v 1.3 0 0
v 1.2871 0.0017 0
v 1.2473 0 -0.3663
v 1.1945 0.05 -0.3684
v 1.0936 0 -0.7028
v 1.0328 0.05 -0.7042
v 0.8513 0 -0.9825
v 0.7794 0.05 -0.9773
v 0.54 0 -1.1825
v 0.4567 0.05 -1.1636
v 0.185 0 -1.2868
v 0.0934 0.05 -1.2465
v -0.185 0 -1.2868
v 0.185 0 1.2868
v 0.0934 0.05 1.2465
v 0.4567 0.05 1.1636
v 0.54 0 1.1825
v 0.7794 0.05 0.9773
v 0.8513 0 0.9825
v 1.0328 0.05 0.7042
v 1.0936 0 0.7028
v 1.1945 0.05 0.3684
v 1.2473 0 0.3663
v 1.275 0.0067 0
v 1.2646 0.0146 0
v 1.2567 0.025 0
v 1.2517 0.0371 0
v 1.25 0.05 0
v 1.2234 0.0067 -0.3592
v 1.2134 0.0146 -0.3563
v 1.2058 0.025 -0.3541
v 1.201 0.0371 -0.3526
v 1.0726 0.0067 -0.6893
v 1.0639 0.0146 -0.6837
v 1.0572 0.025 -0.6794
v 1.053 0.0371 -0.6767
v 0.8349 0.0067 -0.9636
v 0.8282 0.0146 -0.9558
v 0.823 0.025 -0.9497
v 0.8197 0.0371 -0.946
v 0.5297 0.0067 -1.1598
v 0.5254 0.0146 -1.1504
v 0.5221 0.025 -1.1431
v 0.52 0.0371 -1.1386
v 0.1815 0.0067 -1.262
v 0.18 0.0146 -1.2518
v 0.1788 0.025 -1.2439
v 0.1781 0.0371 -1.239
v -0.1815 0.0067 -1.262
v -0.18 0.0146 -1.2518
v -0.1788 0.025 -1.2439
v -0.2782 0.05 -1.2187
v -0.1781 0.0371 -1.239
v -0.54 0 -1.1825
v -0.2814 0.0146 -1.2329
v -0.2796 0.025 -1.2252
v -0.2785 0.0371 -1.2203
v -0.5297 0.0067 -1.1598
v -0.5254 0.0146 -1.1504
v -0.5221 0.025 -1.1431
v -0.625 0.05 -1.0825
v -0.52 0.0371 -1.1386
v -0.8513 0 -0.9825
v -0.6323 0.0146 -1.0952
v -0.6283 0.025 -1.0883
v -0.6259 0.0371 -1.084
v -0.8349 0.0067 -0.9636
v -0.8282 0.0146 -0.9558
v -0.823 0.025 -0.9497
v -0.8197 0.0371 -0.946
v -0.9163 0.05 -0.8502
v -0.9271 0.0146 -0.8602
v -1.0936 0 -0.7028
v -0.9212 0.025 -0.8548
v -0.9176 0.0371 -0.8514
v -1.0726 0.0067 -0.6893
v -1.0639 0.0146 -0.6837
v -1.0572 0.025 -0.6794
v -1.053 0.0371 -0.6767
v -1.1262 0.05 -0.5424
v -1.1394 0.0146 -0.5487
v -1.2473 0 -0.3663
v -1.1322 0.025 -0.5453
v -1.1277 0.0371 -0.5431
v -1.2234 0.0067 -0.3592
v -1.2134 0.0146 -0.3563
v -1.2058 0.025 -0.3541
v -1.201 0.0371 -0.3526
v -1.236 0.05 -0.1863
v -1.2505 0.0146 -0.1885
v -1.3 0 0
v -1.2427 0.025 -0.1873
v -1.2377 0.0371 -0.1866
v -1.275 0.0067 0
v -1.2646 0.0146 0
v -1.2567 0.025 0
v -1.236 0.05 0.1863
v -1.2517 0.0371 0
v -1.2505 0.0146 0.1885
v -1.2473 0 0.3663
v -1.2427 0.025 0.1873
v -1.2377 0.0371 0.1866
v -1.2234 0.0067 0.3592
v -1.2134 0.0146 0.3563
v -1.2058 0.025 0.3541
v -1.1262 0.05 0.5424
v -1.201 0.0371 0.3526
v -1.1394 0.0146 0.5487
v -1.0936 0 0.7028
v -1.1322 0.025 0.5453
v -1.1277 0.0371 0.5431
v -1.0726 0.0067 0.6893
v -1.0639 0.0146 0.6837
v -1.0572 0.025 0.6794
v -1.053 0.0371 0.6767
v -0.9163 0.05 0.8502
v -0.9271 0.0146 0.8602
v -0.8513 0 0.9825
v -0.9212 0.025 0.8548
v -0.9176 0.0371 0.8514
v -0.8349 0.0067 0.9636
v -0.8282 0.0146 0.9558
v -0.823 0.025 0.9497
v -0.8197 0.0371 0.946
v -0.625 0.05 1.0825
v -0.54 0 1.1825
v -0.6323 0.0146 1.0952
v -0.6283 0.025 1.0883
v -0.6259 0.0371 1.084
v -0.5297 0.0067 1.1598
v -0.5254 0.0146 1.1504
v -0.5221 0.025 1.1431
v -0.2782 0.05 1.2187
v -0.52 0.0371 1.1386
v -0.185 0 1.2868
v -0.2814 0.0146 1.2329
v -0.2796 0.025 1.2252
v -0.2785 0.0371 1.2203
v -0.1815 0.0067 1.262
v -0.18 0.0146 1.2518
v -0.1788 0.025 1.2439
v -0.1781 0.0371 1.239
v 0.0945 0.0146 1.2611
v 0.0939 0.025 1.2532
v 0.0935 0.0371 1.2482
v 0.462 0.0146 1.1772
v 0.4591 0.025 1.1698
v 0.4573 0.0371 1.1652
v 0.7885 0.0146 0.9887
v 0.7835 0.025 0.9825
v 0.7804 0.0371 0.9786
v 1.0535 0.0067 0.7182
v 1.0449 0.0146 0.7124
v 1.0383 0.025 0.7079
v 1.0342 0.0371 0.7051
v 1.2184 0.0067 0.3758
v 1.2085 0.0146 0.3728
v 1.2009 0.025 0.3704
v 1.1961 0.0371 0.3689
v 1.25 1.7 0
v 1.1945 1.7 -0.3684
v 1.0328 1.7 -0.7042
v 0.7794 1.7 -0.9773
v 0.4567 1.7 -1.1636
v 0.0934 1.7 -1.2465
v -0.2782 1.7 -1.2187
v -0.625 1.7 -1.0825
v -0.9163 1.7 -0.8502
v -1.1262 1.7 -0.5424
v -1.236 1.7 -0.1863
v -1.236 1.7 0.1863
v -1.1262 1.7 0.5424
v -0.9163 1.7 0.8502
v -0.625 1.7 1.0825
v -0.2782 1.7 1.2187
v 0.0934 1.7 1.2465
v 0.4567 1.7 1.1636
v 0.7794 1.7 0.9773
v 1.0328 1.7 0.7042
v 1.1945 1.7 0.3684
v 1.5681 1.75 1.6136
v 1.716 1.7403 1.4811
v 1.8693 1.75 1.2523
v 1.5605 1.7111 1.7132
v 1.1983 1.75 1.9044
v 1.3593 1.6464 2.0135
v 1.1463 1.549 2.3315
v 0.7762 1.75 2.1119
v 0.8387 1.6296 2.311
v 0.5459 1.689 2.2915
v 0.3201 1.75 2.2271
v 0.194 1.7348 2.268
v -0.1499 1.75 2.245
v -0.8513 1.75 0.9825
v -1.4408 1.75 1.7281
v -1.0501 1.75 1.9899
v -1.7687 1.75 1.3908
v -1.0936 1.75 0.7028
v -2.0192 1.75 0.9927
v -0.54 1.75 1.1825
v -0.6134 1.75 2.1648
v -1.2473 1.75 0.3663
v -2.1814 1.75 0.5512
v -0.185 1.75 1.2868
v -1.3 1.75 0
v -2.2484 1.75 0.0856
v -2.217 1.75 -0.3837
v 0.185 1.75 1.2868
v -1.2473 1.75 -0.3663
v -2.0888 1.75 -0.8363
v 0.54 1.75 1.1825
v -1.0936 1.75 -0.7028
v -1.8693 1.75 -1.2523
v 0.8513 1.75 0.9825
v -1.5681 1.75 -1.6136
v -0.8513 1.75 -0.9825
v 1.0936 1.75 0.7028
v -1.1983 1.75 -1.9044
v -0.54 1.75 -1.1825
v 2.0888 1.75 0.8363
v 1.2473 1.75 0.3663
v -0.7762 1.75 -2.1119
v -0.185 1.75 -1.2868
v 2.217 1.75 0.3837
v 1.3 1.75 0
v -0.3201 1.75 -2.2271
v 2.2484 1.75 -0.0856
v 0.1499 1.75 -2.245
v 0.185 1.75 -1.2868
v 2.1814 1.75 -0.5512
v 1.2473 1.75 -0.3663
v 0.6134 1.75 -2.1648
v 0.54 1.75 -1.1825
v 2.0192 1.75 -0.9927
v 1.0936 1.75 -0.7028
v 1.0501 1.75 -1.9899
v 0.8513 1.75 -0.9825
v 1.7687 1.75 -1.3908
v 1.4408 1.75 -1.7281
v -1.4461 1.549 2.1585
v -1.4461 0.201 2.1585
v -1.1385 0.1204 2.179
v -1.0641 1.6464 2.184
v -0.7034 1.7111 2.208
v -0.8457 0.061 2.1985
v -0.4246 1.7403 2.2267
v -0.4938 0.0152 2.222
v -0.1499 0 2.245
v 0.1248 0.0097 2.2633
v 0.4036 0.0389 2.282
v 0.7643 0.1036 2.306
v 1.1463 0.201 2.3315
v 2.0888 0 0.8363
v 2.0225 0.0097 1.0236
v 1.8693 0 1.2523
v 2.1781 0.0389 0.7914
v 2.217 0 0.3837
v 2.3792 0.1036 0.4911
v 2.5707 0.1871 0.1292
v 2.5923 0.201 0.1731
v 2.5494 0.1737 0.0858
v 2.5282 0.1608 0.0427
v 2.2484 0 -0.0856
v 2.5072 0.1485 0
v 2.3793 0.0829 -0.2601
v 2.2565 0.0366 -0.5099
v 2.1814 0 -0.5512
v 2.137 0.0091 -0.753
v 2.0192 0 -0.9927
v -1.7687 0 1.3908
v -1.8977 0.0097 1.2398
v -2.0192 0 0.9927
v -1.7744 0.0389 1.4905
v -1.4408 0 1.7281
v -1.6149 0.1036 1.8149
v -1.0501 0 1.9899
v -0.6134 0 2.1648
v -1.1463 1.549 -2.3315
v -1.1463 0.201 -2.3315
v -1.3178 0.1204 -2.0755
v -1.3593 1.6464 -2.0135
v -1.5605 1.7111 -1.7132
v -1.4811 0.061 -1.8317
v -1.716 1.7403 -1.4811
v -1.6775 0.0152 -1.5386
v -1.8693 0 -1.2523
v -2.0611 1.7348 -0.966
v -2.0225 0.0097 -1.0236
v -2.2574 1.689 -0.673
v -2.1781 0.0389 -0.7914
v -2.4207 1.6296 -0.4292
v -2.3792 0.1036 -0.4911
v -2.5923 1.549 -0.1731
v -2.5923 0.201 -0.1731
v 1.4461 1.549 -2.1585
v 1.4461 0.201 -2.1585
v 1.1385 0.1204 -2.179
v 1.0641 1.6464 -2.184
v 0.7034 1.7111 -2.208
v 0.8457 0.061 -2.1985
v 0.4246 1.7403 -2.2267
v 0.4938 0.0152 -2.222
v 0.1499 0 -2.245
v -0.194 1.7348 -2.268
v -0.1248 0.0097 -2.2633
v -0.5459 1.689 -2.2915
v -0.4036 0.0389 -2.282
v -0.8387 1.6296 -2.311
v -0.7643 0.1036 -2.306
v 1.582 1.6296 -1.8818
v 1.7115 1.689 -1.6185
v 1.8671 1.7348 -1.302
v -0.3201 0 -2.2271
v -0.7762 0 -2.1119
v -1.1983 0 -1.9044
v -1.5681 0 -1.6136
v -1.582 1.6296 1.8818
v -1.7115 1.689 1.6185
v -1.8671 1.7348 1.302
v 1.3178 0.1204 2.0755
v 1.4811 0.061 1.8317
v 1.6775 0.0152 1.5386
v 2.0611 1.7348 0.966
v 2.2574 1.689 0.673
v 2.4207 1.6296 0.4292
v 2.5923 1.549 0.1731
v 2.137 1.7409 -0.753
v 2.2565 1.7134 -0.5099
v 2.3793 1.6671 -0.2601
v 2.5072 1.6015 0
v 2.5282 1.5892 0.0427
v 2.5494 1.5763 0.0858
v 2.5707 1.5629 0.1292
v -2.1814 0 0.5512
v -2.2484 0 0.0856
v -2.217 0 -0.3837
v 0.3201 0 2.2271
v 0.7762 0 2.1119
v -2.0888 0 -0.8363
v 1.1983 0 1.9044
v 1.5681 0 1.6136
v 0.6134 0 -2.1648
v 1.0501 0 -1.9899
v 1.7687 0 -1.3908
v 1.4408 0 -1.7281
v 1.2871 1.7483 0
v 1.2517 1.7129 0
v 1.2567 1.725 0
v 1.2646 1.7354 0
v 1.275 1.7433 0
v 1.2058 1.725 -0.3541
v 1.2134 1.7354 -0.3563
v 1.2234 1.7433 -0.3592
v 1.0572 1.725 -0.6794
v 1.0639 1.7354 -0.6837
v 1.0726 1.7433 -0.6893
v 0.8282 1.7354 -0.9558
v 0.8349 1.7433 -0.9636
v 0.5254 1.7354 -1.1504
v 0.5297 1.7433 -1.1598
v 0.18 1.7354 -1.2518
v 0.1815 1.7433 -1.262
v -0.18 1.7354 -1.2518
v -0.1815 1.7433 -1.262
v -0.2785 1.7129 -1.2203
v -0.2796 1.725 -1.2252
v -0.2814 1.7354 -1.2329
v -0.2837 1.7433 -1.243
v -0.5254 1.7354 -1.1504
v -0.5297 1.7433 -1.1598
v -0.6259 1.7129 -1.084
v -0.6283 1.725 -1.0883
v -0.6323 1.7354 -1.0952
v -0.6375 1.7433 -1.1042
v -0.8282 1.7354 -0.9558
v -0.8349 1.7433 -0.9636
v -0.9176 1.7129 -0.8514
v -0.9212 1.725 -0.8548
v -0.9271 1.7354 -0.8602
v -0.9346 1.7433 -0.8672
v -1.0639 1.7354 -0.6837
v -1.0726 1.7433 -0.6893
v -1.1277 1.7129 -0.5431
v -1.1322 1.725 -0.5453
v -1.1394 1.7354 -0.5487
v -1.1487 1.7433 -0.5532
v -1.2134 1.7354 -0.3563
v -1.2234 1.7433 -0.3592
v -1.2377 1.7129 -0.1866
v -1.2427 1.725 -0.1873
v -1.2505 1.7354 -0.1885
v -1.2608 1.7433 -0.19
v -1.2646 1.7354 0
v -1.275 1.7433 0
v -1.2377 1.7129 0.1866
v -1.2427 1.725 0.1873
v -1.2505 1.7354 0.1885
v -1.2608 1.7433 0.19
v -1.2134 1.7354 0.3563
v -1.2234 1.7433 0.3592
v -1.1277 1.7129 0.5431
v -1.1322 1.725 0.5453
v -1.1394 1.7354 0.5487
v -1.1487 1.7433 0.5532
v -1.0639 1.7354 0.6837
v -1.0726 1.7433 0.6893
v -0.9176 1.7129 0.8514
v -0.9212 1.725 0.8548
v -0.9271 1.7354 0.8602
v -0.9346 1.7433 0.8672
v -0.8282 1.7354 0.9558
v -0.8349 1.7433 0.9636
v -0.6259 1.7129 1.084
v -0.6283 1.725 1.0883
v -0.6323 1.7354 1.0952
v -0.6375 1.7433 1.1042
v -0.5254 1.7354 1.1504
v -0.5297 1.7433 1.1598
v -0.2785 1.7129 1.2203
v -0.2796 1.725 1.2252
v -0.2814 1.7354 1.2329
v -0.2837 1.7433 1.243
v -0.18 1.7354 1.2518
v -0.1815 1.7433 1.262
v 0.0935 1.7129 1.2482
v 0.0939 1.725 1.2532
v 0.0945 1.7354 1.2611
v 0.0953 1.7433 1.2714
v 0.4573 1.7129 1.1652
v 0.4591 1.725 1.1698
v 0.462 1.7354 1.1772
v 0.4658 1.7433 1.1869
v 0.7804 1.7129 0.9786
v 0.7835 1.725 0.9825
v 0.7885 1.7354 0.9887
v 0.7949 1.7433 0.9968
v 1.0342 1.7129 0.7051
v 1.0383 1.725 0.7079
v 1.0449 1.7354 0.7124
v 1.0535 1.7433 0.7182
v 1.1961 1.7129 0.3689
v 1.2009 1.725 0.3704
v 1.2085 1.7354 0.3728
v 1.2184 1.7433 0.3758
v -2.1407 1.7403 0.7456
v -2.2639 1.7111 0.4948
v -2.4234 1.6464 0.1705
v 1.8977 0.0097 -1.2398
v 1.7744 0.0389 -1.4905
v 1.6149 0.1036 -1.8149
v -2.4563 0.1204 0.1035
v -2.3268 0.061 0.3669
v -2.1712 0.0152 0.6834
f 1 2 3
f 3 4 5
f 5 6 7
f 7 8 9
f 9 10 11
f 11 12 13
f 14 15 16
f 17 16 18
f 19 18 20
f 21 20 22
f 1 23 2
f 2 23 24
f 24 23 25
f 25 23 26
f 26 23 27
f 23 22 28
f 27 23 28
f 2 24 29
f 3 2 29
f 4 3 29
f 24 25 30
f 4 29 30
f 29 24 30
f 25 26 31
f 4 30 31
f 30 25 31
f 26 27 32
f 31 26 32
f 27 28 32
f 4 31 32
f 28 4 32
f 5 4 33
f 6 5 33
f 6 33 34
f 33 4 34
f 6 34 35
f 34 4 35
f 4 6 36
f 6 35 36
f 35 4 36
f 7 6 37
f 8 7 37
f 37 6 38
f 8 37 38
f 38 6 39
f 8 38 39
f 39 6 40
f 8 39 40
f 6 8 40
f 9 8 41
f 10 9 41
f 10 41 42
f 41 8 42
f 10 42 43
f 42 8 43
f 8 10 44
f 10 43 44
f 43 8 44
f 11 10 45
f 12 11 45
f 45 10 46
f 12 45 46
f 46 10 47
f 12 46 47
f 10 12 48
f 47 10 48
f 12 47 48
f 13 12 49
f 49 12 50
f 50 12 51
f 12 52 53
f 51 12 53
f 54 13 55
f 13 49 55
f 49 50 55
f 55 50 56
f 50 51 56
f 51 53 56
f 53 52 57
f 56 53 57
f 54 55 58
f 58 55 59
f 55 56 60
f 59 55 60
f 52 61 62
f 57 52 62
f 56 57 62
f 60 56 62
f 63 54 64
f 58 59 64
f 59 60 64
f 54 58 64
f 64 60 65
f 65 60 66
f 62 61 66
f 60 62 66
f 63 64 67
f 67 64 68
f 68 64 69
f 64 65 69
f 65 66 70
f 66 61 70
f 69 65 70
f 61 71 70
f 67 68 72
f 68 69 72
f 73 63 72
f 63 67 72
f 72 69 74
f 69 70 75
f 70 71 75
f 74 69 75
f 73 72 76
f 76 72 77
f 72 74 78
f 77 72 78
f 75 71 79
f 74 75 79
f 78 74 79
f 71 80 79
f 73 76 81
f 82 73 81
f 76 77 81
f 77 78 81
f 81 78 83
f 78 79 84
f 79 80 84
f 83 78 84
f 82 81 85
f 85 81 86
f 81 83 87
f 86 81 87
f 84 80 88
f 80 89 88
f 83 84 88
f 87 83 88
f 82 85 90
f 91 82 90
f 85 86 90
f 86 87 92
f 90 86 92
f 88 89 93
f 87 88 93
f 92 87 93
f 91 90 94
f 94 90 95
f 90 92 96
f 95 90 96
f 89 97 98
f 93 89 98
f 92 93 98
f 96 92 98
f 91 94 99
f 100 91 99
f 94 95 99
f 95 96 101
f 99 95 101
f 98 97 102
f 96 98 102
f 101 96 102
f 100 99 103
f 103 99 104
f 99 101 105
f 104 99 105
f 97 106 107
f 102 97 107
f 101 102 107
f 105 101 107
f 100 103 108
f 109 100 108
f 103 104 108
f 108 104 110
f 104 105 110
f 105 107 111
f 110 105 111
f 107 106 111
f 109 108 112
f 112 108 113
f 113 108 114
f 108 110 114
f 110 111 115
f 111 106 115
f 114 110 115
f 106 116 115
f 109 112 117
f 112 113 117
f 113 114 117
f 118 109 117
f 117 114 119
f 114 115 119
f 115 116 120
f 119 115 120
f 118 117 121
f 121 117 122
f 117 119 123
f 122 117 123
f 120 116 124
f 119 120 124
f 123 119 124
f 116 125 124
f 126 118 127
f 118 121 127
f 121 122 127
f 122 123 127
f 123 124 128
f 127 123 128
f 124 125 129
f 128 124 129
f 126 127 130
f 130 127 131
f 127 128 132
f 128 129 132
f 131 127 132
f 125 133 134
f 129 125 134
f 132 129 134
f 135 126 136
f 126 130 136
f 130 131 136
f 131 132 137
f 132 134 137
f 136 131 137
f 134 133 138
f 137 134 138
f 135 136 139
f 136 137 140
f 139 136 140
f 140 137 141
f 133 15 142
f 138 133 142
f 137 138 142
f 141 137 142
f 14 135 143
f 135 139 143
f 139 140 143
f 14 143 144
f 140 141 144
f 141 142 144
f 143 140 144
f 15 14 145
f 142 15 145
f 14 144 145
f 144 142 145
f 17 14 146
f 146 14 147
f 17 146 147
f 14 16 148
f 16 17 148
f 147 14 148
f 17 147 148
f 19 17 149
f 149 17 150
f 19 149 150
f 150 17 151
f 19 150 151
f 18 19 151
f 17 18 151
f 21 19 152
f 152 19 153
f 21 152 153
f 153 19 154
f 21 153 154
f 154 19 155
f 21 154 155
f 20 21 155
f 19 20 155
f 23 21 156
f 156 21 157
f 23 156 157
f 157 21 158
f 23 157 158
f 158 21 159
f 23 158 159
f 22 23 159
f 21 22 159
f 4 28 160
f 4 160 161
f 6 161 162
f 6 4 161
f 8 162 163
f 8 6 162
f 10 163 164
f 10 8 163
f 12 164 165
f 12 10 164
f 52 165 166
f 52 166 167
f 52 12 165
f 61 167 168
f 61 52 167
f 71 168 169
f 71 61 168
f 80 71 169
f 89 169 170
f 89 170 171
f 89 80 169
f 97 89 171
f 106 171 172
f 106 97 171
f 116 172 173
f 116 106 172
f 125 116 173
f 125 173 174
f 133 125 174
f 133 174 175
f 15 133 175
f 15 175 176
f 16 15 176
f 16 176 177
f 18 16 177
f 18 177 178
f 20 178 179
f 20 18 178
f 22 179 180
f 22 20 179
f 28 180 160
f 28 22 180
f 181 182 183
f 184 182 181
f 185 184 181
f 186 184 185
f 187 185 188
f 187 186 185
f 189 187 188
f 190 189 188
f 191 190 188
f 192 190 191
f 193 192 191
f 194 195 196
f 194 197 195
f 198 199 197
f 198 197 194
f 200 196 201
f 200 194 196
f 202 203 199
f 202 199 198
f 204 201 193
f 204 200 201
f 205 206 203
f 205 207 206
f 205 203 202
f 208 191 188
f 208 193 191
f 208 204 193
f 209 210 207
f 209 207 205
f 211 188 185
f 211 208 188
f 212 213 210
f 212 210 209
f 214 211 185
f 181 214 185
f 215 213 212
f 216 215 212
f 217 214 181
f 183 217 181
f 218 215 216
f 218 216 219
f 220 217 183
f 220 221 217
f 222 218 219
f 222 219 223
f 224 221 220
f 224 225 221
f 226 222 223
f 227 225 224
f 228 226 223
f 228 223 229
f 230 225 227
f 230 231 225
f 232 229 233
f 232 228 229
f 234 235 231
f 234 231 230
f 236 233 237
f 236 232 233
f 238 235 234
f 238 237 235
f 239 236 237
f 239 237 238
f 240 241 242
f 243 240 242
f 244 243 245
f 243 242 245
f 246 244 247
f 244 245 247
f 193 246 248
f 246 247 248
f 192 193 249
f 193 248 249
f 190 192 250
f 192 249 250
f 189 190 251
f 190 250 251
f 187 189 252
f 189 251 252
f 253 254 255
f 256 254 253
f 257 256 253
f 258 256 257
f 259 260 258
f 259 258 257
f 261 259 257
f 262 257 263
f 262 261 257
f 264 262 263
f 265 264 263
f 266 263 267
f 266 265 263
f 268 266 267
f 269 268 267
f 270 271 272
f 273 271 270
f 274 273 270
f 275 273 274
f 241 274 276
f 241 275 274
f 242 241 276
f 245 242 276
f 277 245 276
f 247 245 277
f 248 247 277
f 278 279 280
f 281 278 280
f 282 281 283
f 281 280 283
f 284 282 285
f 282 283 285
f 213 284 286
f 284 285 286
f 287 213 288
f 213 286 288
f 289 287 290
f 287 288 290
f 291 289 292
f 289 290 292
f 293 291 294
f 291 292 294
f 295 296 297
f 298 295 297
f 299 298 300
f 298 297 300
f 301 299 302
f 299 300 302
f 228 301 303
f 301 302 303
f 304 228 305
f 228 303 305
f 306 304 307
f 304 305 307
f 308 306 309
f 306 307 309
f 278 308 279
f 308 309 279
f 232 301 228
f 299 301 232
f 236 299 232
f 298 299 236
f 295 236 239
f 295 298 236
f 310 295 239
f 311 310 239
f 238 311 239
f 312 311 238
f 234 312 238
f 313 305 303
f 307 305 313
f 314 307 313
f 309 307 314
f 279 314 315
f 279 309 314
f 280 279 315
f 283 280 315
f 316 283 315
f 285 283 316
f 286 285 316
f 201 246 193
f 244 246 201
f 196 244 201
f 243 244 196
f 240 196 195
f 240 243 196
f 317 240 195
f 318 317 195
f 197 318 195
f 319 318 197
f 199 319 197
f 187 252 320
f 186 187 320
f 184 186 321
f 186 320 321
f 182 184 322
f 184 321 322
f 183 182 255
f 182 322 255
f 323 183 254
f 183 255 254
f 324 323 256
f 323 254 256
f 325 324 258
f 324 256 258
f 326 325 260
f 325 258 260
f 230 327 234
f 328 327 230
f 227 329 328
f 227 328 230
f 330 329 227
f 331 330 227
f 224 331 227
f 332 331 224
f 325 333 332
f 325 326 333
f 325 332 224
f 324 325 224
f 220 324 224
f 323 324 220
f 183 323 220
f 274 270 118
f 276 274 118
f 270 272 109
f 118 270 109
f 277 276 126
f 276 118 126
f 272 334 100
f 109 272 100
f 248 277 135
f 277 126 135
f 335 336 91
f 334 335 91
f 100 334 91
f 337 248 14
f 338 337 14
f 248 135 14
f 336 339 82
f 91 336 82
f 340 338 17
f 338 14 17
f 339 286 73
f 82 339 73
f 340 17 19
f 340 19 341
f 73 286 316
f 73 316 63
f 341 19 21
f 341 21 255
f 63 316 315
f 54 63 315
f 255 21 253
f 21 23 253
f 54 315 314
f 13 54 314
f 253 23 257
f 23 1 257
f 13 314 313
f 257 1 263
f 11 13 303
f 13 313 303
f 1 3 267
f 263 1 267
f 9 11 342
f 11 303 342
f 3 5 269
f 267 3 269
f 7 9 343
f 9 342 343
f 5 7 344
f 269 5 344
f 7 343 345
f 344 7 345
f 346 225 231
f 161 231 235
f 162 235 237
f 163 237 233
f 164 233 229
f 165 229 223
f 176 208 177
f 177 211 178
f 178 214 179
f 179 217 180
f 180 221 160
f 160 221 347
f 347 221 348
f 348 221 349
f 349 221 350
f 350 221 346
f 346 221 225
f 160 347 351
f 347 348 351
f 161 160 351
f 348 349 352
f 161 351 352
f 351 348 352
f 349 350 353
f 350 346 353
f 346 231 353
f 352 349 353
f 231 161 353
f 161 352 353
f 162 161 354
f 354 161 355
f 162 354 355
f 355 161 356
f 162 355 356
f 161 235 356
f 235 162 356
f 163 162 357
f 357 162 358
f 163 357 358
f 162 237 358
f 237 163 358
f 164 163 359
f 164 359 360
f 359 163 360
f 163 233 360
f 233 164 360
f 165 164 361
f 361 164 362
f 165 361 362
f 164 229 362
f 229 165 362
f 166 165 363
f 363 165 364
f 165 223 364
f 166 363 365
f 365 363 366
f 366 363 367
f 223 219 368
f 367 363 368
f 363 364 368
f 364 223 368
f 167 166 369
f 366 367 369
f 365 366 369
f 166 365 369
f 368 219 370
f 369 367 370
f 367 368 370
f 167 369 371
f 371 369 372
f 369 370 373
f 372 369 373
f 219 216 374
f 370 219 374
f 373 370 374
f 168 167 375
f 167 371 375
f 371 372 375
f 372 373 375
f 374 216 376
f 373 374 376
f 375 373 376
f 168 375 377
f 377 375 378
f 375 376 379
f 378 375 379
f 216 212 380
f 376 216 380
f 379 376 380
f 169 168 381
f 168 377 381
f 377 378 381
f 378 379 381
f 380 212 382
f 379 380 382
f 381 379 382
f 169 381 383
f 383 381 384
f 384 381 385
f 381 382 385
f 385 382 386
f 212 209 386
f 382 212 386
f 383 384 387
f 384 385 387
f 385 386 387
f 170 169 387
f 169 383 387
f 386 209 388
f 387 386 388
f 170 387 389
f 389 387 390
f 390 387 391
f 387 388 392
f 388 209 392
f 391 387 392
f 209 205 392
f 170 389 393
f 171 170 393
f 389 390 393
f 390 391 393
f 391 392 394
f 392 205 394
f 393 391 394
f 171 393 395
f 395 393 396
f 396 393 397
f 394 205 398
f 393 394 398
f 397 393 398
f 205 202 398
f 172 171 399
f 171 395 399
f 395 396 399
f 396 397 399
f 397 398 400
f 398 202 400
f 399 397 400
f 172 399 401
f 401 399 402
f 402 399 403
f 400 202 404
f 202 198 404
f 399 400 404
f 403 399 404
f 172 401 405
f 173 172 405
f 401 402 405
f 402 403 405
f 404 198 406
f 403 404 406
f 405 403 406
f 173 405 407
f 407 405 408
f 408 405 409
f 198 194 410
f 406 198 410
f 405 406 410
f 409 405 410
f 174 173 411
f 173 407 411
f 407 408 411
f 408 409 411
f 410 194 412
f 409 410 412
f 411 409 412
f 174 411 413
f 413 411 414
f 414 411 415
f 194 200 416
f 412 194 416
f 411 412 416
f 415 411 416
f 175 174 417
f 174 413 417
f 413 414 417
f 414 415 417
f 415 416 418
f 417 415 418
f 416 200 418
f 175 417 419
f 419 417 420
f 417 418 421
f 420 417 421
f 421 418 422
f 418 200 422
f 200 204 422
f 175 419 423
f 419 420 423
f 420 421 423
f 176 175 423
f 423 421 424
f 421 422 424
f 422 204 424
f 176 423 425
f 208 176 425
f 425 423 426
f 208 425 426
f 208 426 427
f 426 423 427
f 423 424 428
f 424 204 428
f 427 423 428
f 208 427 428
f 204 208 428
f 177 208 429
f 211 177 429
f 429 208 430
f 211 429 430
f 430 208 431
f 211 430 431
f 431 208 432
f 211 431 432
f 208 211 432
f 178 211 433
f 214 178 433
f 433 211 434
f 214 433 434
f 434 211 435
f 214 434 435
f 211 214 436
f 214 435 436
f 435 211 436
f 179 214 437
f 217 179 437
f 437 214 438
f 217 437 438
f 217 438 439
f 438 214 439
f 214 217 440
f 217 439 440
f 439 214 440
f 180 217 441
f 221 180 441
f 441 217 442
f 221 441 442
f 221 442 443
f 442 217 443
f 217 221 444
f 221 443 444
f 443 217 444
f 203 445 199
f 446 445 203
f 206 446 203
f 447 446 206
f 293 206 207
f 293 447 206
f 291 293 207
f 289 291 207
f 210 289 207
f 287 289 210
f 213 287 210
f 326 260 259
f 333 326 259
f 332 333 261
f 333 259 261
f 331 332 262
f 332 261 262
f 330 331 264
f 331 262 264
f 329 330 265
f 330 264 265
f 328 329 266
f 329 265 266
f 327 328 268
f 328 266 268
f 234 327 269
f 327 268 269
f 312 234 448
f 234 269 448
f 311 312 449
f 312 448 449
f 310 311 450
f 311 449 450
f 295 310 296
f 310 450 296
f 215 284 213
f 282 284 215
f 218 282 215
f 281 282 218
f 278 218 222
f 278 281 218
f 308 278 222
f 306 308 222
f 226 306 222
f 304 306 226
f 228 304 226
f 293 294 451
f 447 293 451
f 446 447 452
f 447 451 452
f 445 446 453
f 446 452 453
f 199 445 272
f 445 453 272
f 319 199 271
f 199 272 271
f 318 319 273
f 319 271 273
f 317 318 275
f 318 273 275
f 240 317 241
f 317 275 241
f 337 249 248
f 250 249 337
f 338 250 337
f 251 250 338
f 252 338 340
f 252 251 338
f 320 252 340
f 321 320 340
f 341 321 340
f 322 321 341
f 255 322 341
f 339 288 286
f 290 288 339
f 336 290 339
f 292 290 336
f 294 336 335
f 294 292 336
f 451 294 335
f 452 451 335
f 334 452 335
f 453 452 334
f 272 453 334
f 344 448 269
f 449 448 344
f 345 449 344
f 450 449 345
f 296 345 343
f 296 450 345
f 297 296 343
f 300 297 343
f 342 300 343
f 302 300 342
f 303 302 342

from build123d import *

# Parameters (mm, degrees)
SKETCH1_R           = 1.25
BOSS_EXTRUDE1_DEPTH = 1.75
SKETCH2_OUTSIDE_W   = 15.55
SKETCH2_OUTSIDE_H   = 15.03
SKETCH2_OUTSIDE_R   = 2.25
CUT_EXTRUDE1_DEPTH  = 2
CUT_EXTRUDE1_TAPER  = 60
SKETCH3_OUTSIDE_W   = 15.55
SKETCH3_OUTSIDE_H   = 15.03
SKETCH3_OUTSIDE_R   = 2.25
CUT_EXTRUDE2_DEPTH  = 2
CUT_EXTRUDE2_TAPER  = 60
FILLET1_R           = 0.05


with BuildPart() as part:
    # Sketch1 → Boss-Extrude1 (new body)
    with BuildSketch(Plane(origin=(0, 0, 0), x_dir=(1, 0, 0), z_dir=(0, 1, 0))):
        Polygon((-2.592304058, 0.173088625), (-1.446051175, -2.158456856), (1.146252883, -2.331545481), (2.592304058, -0.173088625), (1.446051175, 2.158456856), (-1.146252883, 2.331545481), align=None)
        Circle(SKETCH1_R, mode=Mode.SUBTRACT)
    extrude(amount=BOSS_EXTRUDE1_DEPTH)

    # Sketch2 outside → Cut-Extrude1 (cut)
    with BuildSketch(Plane(origin=(0, 1.75, 0), x_dir=(1, 0, 0), z_dir=(0, 1, 0))):
        Rectangle(SKETCH2_OUTSIDE_W, SKETCH2_OUTSIDE_H)
        Circle(SKETCH2_OUTSIDE_R, mode=Mode.SUBTRACT)
    extrude(amount=-CUT_EXTRUDE1_DEPTH, taper=CUT_EXTRUDE1_TAPER, mode=Mode.SUBTRACT)

    # Sketch3 outside → Cut-Extrude2 (cut)
    with BuildSketch(Plane.XZ):
        Rectangle(SKETCH3_OUTSIDE_W, SKETCH3_OUTSIDE_H)
        Circle(SKETCH3_OUTSIDE_R, mode=Mode.SUBTRACT)
    extrude(amount=-CUT_EXTRUDE2_DEPTH, taper=CUT_EXTRUDE2_TAPER, mode=Mode.SUBTRACT)

    # Fillet1
    fillet1_edges = [part.edges().sort_by_distance(p)[0] for p in [
        (-1.25, 0, 0),
        (-1.25, 1.75, 0),
    ]]
    fillet(fillet1_edges, radius=FILLET1_R)


solid = part.part
